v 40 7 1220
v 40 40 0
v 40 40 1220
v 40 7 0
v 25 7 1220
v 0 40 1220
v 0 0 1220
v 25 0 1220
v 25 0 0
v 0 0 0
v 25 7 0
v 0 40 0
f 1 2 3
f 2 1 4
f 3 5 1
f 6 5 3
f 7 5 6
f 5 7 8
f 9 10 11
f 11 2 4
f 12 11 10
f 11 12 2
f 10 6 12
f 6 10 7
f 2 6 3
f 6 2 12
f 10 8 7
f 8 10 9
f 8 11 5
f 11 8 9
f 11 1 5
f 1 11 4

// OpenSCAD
panes_w = 4;
panes_l = 5;
base_ext_width = 2750;
base_ext_length = 3400;
base_ext_height = 609;
base_backwall_height = 1200;
brick_width = 112;
delta = 5;

corner_post_width = 40;
corner_post_height = 1220;

plinth_width = 120;
plinth_height = 20;
plinth_overlap = 10;

row_post_width = 40;

pane_width = 610;
pane_height = 1220;
pane_thickness = 4;
pane_tollerance_gap = 5;

trim_width = 20;
trim_height = 10;

arch_width = 300;
arch_height = 500;
arch_base_height = 900;

//Calculated
CPW = pane_width + 2* pane_tollerance_gap;
CPH = pane_height + 2* pane_tollerance_gap;

//calculated internal width
CIW = (row_post_width*(panes_w-1))+(CPW*panes_w); 
//calculated internal length
CIL = (row_post_width*(panes_l-1))+(CPW*panes_l); 

CEW = CIW + 2* brick_width;
CEL = CIL + 2* brick_width;

base_door_gap = 2*pane_width +  3*row_post_width;



//TexBase();
color([0.5,0.3,0.20,1])
Verticles();
//color([0.5,0.3,0.20,1])
//Plinth();
//Glass();


module Glass(){
translate([CIW/2 + 40,-CIL/2,base_ext_height+plinth_height])
    for(y = [0 : 1 : panes_l-1]){
        translate([0,y*(CPW+row_post_width),0])
            Pane();
    }
}

module Pane(){
    translate([trim_width,0,0]){
        translate([0,pane_tollerance_gap,pane_tollerance_gap])   
            color([0.7,0.9,0.9], alpha = 0.3)
                %cube([pane_thickness, pane_width, pane_height]);
        
        color([0.5,0.3,0.20,1])  {
        translate([-trim_width,trim_height,0])  
           cube([trim_width, pane_width+2*pane_tollerance_gap -2*trim_height, trim_height]);
            
        translate([-trim_width,trim_height,pane_height+ 2*pane_tollerance_gap -trim_height ])
           cube([trim_width, pane_width+2*pane_tollerance_gap -2*trim_height, trim_height]);
            
        translate([-trim_width,0,0])
           cube([trim_width, trim_height, pane_height+2*pane_tollerance_gap]);

        translate([-trim_width,CPW-trim_height,0])
           cube([trim_width, trim_height, pane_height+2*pane_tollerance_gap]);  
        } 
    }
} 



module Plinth(){  
difference(){
    translate([-CEW/2-plinth_overlap,-CEL/2-plinth_overlap,base_ext_height])
        cube([CEW+2*plinth_overlap, plinth_width, plinth_height]);
 
 
    translate([-base_door_gap/2, -CEL/2 -plinth_overlap - delta,-delta+base_ext_height])
        cube([ base_door_gap, plinth_width+2*delta,plinth_height+2*delta]);
}  

translate([-CEW/2-plinth_overlap,CEL/2+plinth_overlap -plinth_width,base_ext_height])
    cube([CEW+2*plinth_overlap, plinth_width, plinth_height]);
    
translate([CEW/2 - plinth_width + plinth_overlap ,-CEL/2 -plinth_overlap + plinth_width ,base_ext_height])
    cube([plinth_width, CEL+2*plinth_overlap-2*plinth_width, plinth_height]);
}   

module Verticles(){   
//corner supports
//    for(x = [-1 : 2 : 1]){
//    for(y = [-1 : 2 : 1]){
//        translate(
//            [x*(corner_post_width/2 + CIW*0.5) -corner_post_width/2,
//            y*(corner_post_width/2 + CIL*0.5) -corner_post_width/2,
//            base_ext_height+plinth_height])
//            cube([corner_post_width, corner_post_width, corner_post_height]);
//        }
//    }
    
    Post(corner_post_width,corner_post_width,corner_post_height, "lend", 15,7);
 
//side supports
//translate([CIW*0.5,
//-CIL/2+ CPW + 0.5*row_post_width
//,base_ext_height+plinth_height])
//for(y = [0 : 1 : panes_l-2]){
//    translate(
//        [0,
//        y*(row_post_width+CPW)-row_post_width/2,
//        0])
//        cube([
//            corner_post_width,
//            row_post_width,
//            corner_post_height]);
//}


//back supports
//translate([-CIW/2 + pane_width + 0.5*row_post_width, 
//+CIL/2, 
//base_ext_height+plinth_height])
//    for(x = [0 : 1 : panes_w-2])
//        translate([x*(row_post_width+pane_width)-row_post_width/2,0,0])
//            cube([row_post_width, corner_post_width, corner_post_height]);
  
}


module Post(width, depth, height, type, cutWidth, cutDepth){
    difference(){
        
   
        cube([width, depth, height]);
             if (type=="lend"){
                 translate([width-cutWidth,-delta,-delta])   
                    cube([cutWidth+delta, cutDepth+delta, height+2*delta]);
             }else {
                translate([-delta, -delta,-delta])   
                    cube([cutWidth+delta, cutDepth+delta, height+2*delta]);
             }
             
        if (type=="corner"){    
            translate([width-cutDepth, depth-cutWidth,-delta])   
                cube([cutDepth+delta, cutWidth+delta, height+2*delta]);
        }
        
        if (type=="straight"){    
            translate([width-cutWidth,-delta,-delta])   
                cube([cutWidth+delta, cutDepth+delta, height+2*delta]);
        }
    }
}



module TexBase(){
   
    
   color("Gray", 1.0) {
    intersection(){ 
           Slats();
           Base(); 
       }
   }
   translate([1,0,0])
   color("Maroon", 1.0) {
       difference(){ 
           Base(); 
           Slats();
       }
   }
   
         
}

module Slats(){
   union(){ 
       for(z = [0 : 1 : 20]){
            translate([-2500,-2500,z*100])
                cube([5000,5000,10]);
       }
   }   
}

module Base(){
    
    difference(){
        translate([-CEW/2, -CEL/2,0])
            cube([CEW,CEL,base_ext_height]);
            
        translate([-CEW/2 + brick_width, -CEL/2 + brick_width,-delta])
            cube([CEW-2*brick_width,CEL-2*brick_width,base_ext_height+2*delta]);
     
     
        translate([-base_door_gap/2, -CEL/2-delta,-delta])
            cube([ base_door_gap, brick_width+2*delta,base_ext_height+2*delta]);
        

    }

    difference(){
        translate([-CEW/2,-CEL/2 +brick_width,base_ext_height])
            cube([brick_width,CEL-2*brick_width, base_backwall_height]);


        translate([-CEW/2 -delta,0,arch_base_height]){
            union(){
                translate([0,0,arch_height- arch_width/2])
                    rotate([0,90,0])
                        cylinder(r=arch_width/2, h=500);
                translate([0,-arch_width/2,0])
                    cube([500,arch_width,arch_height-arch_width/2]);
            }
        }        
    }
    
}
